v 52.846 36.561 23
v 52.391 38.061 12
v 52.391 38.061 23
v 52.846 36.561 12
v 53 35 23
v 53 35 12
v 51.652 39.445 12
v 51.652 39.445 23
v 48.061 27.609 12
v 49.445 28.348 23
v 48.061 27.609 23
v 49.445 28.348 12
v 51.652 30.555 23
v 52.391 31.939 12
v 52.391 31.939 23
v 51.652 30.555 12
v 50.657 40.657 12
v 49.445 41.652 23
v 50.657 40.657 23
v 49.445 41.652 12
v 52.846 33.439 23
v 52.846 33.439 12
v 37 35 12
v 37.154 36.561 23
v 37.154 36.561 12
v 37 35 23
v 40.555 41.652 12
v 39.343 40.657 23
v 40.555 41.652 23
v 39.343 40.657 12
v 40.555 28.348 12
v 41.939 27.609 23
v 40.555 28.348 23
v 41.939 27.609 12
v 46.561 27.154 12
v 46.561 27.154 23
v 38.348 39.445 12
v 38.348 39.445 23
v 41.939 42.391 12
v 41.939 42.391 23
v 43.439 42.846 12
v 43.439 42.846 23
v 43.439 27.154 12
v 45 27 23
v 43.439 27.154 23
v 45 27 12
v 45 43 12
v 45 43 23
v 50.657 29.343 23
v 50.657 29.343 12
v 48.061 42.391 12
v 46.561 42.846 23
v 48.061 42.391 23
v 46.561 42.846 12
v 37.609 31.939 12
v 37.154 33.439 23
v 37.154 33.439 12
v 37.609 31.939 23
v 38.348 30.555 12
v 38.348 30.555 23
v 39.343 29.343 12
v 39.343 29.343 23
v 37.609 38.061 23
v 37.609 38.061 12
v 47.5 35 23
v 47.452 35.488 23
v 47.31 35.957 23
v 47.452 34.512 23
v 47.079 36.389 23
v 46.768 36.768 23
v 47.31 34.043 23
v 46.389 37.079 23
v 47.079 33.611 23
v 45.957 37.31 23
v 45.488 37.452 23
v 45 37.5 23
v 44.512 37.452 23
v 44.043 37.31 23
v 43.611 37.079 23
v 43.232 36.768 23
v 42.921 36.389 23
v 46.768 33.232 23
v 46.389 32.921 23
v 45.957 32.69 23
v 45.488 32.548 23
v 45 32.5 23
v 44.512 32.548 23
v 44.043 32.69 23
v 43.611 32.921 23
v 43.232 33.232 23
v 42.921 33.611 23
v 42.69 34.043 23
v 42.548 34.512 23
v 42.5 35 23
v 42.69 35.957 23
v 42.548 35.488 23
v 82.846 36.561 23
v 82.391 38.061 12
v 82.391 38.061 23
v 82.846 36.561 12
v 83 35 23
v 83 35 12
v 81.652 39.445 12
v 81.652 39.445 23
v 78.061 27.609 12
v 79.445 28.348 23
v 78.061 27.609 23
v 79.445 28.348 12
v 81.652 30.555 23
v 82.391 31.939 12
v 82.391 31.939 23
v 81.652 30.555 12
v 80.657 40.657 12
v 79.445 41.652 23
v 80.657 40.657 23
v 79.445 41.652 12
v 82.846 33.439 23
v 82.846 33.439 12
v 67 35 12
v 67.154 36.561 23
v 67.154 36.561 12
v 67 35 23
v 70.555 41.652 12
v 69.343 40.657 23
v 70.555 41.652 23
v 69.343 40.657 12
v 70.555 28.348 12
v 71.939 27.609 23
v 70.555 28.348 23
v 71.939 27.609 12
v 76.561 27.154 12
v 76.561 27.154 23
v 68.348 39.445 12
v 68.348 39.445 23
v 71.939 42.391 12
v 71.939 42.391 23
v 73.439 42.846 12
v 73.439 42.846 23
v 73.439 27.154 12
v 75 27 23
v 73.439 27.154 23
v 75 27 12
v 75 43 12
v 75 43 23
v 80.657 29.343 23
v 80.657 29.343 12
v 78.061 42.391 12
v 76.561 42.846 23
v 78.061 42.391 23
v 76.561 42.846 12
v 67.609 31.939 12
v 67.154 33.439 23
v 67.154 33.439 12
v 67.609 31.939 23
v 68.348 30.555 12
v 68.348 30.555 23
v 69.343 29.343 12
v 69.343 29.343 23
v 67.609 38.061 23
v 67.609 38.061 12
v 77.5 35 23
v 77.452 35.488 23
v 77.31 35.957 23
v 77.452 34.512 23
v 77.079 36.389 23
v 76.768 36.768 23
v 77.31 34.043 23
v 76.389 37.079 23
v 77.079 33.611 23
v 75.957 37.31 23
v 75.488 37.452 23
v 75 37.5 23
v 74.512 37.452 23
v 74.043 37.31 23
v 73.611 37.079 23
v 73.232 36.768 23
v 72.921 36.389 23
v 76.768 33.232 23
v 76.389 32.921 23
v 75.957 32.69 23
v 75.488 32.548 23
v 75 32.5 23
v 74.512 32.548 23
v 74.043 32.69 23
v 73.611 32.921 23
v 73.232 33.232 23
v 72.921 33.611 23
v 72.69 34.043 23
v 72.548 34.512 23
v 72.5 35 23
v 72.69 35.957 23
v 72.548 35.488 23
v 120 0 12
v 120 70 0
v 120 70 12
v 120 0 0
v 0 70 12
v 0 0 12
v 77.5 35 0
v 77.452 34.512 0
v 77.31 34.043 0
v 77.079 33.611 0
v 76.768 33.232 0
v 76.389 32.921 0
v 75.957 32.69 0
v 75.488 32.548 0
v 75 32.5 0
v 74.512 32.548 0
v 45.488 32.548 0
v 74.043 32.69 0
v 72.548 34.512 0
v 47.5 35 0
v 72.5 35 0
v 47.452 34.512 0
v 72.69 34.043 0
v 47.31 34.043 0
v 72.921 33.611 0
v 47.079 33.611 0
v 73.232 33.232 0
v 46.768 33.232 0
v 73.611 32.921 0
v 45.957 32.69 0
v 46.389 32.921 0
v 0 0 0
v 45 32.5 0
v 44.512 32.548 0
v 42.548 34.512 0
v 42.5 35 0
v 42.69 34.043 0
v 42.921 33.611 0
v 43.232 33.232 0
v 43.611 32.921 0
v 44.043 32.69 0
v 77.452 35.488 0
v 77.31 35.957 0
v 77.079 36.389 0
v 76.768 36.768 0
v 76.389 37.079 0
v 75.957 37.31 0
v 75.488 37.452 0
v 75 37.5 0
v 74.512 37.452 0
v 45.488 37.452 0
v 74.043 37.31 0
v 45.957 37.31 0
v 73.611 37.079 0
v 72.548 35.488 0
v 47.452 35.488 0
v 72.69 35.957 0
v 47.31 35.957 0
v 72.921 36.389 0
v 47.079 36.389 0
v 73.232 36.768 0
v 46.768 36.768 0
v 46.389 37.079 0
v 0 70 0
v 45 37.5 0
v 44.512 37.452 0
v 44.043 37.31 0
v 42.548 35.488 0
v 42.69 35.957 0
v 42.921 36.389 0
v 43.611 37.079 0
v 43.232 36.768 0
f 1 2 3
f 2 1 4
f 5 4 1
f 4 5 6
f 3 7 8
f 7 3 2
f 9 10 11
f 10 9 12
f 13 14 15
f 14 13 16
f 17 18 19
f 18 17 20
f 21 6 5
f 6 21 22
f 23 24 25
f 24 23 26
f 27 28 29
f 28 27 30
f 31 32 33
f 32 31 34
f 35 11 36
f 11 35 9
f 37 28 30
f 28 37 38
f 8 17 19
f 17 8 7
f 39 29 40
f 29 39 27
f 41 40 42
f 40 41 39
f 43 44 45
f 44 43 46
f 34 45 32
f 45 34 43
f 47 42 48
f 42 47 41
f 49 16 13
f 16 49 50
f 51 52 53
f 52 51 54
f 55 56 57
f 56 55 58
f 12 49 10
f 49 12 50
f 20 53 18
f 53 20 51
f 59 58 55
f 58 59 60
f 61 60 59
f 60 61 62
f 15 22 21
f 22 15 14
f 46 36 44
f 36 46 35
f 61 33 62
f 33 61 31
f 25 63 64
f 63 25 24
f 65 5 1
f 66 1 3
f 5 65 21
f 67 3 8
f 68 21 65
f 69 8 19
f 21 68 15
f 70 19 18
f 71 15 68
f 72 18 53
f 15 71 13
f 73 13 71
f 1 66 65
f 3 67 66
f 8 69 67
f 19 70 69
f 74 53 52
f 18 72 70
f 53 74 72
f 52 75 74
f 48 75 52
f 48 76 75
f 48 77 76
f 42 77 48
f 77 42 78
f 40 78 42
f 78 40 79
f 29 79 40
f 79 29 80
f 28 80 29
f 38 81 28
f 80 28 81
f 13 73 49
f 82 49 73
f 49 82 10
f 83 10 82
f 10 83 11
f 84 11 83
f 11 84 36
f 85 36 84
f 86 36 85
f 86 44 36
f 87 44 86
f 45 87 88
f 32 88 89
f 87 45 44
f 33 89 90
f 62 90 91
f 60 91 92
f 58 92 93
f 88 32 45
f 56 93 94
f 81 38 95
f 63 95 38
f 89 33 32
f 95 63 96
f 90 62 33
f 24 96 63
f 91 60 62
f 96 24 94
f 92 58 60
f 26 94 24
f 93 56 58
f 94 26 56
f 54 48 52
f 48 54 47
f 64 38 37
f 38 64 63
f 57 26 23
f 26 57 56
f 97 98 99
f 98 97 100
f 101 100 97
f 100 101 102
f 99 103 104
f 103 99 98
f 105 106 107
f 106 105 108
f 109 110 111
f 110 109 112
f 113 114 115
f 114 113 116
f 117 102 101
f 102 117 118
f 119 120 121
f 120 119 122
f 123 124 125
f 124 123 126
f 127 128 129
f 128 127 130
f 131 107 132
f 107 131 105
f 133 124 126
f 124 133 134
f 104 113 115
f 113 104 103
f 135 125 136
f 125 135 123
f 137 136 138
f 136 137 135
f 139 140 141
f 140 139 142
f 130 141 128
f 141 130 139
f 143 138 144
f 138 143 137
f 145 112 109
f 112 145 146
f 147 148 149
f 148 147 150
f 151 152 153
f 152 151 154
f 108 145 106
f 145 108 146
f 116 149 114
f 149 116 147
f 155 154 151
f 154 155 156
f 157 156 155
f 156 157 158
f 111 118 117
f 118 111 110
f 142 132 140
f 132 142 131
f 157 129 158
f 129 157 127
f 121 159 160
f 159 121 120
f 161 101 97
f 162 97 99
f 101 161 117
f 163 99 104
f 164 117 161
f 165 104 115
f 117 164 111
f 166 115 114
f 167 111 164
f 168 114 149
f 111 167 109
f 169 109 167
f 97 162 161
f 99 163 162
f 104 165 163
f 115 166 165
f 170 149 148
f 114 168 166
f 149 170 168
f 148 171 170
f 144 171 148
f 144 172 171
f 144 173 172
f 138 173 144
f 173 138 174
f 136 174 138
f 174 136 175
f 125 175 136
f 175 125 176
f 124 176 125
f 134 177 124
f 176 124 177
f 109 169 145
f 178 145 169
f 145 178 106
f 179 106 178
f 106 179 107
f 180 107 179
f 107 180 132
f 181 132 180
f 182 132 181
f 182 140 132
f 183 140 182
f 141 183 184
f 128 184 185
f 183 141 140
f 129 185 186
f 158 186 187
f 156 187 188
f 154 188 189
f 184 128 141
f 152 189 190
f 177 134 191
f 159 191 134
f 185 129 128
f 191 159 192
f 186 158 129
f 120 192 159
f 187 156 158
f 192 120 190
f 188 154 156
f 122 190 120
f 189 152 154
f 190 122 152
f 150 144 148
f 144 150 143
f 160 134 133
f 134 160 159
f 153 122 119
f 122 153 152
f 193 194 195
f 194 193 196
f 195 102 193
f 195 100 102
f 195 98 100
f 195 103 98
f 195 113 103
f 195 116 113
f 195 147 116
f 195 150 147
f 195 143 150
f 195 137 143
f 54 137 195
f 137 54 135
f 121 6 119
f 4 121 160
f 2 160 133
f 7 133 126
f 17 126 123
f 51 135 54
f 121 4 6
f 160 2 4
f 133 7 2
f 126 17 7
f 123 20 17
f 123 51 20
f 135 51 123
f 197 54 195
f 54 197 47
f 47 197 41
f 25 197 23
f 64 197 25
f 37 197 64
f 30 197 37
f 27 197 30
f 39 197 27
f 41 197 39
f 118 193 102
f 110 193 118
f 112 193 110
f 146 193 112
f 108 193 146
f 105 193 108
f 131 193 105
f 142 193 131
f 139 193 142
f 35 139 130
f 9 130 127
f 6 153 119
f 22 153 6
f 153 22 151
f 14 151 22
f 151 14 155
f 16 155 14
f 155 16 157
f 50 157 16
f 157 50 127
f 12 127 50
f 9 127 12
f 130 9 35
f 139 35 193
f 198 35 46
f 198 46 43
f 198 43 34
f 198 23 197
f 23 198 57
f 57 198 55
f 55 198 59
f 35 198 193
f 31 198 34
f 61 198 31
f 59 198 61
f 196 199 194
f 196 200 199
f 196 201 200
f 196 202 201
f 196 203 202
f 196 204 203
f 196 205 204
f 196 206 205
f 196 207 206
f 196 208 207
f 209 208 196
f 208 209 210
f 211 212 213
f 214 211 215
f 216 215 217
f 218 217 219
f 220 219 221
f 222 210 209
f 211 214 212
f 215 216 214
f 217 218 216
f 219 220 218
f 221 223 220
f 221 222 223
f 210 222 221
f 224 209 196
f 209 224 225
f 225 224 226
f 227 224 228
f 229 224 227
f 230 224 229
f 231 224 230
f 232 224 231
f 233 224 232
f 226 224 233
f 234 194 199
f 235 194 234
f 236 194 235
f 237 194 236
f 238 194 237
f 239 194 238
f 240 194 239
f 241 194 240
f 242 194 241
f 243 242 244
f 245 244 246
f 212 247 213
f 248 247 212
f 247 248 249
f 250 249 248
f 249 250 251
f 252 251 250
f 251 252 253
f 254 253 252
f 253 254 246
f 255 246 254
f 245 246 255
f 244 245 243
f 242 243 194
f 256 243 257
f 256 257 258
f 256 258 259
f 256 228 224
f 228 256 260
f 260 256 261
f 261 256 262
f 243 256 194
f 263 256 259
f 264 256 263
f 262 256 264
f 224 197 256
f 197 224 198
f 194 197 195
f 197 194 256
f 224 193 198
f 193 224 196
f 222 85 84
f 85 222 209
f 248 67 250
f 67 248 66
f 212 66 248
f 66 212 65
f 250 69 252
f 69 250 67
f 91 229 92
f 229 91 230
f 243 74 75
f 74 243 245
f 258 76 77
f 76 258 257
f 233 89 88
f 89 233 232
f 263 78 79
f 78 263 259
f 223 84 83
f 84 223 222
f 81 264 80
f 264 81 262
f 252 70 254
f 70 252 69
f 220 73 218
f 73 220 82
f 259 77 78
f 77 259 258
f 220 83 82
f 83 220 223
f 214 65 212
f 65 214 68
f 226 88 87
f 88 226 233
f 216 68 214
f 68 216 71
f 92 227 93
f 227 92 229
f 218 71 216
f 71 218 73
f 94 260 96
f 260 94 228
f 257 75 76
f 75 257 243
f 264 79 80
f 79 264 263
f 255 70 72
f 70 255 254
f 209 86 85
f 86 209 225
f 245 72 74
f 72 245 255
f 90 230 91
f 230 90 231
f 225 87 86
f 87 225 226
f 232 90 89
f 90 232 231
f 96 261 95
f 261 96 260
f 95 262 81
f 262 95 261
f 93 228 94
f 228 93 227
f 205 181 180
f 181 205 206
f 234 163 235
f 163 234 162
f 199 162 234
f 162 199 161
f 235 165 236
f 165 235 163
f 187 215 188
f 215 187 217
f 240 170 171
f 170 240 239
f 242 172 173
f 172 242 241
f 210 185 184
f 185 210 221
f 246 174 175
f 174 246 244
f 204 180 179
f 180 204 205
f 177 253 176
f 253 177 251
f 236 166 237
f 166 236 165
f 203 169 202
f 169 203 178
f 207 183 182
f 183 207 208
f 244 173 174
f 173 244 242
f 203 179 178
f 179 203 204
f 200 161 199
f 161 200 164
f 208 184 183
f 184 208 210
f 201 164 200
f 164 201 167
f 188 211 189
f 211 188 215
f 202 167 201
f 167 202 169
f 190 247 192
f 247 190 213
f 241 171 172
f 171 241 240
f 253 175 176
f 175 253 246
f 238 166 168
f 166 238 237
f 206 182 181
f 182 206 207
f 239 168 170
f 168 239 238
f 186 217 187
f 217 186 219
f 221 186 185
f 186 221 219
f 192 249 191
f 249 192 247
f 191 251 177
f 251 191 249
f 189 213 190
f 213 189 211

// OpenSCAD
$fn = 32;

// ----------------------------------------------------------------------
// Drill jig: two_boss jig
// ----------------------------------------------------------------------

// --- parameters (mm) ---
plate_l = 120;            // plate length, X
plate_w = 70;             // plate width, Y
plate_t = 12;             // plate thickness
boss_d = 16;              // guide boss diameter
boss_h = 12;              // boss height above the plate
guide_d = 5;              // guide hole diameter
boss_pitch = 30;          // boss pitch

n_boss = 2;  // guide bosses
boss_x0 = (plate_l - (n_boss - 1) * boss_pitch) / 2;  // first boss X
boss_top = plate_t - 1 + boss_h;  // boss crown height
total_h = boss_top;  // overall height

difference() {
  union() {
  cube([plate_l, plate_w, plate_t]);
  for (i = [0 : n_boss - 1])
    translate([boss_x0 + i * boss_pitch, plate_w / 2, plate_t - 1])
      cylinder(h = boss_h, d = boss_d);
  }
  for (i = [0 : n_boss - 1])
    translate([boss_x0 + i * boss_pitch, plate_w / 2, -1])
      cylinder(h = plate_t + boss_h, d = guide_d);
}
